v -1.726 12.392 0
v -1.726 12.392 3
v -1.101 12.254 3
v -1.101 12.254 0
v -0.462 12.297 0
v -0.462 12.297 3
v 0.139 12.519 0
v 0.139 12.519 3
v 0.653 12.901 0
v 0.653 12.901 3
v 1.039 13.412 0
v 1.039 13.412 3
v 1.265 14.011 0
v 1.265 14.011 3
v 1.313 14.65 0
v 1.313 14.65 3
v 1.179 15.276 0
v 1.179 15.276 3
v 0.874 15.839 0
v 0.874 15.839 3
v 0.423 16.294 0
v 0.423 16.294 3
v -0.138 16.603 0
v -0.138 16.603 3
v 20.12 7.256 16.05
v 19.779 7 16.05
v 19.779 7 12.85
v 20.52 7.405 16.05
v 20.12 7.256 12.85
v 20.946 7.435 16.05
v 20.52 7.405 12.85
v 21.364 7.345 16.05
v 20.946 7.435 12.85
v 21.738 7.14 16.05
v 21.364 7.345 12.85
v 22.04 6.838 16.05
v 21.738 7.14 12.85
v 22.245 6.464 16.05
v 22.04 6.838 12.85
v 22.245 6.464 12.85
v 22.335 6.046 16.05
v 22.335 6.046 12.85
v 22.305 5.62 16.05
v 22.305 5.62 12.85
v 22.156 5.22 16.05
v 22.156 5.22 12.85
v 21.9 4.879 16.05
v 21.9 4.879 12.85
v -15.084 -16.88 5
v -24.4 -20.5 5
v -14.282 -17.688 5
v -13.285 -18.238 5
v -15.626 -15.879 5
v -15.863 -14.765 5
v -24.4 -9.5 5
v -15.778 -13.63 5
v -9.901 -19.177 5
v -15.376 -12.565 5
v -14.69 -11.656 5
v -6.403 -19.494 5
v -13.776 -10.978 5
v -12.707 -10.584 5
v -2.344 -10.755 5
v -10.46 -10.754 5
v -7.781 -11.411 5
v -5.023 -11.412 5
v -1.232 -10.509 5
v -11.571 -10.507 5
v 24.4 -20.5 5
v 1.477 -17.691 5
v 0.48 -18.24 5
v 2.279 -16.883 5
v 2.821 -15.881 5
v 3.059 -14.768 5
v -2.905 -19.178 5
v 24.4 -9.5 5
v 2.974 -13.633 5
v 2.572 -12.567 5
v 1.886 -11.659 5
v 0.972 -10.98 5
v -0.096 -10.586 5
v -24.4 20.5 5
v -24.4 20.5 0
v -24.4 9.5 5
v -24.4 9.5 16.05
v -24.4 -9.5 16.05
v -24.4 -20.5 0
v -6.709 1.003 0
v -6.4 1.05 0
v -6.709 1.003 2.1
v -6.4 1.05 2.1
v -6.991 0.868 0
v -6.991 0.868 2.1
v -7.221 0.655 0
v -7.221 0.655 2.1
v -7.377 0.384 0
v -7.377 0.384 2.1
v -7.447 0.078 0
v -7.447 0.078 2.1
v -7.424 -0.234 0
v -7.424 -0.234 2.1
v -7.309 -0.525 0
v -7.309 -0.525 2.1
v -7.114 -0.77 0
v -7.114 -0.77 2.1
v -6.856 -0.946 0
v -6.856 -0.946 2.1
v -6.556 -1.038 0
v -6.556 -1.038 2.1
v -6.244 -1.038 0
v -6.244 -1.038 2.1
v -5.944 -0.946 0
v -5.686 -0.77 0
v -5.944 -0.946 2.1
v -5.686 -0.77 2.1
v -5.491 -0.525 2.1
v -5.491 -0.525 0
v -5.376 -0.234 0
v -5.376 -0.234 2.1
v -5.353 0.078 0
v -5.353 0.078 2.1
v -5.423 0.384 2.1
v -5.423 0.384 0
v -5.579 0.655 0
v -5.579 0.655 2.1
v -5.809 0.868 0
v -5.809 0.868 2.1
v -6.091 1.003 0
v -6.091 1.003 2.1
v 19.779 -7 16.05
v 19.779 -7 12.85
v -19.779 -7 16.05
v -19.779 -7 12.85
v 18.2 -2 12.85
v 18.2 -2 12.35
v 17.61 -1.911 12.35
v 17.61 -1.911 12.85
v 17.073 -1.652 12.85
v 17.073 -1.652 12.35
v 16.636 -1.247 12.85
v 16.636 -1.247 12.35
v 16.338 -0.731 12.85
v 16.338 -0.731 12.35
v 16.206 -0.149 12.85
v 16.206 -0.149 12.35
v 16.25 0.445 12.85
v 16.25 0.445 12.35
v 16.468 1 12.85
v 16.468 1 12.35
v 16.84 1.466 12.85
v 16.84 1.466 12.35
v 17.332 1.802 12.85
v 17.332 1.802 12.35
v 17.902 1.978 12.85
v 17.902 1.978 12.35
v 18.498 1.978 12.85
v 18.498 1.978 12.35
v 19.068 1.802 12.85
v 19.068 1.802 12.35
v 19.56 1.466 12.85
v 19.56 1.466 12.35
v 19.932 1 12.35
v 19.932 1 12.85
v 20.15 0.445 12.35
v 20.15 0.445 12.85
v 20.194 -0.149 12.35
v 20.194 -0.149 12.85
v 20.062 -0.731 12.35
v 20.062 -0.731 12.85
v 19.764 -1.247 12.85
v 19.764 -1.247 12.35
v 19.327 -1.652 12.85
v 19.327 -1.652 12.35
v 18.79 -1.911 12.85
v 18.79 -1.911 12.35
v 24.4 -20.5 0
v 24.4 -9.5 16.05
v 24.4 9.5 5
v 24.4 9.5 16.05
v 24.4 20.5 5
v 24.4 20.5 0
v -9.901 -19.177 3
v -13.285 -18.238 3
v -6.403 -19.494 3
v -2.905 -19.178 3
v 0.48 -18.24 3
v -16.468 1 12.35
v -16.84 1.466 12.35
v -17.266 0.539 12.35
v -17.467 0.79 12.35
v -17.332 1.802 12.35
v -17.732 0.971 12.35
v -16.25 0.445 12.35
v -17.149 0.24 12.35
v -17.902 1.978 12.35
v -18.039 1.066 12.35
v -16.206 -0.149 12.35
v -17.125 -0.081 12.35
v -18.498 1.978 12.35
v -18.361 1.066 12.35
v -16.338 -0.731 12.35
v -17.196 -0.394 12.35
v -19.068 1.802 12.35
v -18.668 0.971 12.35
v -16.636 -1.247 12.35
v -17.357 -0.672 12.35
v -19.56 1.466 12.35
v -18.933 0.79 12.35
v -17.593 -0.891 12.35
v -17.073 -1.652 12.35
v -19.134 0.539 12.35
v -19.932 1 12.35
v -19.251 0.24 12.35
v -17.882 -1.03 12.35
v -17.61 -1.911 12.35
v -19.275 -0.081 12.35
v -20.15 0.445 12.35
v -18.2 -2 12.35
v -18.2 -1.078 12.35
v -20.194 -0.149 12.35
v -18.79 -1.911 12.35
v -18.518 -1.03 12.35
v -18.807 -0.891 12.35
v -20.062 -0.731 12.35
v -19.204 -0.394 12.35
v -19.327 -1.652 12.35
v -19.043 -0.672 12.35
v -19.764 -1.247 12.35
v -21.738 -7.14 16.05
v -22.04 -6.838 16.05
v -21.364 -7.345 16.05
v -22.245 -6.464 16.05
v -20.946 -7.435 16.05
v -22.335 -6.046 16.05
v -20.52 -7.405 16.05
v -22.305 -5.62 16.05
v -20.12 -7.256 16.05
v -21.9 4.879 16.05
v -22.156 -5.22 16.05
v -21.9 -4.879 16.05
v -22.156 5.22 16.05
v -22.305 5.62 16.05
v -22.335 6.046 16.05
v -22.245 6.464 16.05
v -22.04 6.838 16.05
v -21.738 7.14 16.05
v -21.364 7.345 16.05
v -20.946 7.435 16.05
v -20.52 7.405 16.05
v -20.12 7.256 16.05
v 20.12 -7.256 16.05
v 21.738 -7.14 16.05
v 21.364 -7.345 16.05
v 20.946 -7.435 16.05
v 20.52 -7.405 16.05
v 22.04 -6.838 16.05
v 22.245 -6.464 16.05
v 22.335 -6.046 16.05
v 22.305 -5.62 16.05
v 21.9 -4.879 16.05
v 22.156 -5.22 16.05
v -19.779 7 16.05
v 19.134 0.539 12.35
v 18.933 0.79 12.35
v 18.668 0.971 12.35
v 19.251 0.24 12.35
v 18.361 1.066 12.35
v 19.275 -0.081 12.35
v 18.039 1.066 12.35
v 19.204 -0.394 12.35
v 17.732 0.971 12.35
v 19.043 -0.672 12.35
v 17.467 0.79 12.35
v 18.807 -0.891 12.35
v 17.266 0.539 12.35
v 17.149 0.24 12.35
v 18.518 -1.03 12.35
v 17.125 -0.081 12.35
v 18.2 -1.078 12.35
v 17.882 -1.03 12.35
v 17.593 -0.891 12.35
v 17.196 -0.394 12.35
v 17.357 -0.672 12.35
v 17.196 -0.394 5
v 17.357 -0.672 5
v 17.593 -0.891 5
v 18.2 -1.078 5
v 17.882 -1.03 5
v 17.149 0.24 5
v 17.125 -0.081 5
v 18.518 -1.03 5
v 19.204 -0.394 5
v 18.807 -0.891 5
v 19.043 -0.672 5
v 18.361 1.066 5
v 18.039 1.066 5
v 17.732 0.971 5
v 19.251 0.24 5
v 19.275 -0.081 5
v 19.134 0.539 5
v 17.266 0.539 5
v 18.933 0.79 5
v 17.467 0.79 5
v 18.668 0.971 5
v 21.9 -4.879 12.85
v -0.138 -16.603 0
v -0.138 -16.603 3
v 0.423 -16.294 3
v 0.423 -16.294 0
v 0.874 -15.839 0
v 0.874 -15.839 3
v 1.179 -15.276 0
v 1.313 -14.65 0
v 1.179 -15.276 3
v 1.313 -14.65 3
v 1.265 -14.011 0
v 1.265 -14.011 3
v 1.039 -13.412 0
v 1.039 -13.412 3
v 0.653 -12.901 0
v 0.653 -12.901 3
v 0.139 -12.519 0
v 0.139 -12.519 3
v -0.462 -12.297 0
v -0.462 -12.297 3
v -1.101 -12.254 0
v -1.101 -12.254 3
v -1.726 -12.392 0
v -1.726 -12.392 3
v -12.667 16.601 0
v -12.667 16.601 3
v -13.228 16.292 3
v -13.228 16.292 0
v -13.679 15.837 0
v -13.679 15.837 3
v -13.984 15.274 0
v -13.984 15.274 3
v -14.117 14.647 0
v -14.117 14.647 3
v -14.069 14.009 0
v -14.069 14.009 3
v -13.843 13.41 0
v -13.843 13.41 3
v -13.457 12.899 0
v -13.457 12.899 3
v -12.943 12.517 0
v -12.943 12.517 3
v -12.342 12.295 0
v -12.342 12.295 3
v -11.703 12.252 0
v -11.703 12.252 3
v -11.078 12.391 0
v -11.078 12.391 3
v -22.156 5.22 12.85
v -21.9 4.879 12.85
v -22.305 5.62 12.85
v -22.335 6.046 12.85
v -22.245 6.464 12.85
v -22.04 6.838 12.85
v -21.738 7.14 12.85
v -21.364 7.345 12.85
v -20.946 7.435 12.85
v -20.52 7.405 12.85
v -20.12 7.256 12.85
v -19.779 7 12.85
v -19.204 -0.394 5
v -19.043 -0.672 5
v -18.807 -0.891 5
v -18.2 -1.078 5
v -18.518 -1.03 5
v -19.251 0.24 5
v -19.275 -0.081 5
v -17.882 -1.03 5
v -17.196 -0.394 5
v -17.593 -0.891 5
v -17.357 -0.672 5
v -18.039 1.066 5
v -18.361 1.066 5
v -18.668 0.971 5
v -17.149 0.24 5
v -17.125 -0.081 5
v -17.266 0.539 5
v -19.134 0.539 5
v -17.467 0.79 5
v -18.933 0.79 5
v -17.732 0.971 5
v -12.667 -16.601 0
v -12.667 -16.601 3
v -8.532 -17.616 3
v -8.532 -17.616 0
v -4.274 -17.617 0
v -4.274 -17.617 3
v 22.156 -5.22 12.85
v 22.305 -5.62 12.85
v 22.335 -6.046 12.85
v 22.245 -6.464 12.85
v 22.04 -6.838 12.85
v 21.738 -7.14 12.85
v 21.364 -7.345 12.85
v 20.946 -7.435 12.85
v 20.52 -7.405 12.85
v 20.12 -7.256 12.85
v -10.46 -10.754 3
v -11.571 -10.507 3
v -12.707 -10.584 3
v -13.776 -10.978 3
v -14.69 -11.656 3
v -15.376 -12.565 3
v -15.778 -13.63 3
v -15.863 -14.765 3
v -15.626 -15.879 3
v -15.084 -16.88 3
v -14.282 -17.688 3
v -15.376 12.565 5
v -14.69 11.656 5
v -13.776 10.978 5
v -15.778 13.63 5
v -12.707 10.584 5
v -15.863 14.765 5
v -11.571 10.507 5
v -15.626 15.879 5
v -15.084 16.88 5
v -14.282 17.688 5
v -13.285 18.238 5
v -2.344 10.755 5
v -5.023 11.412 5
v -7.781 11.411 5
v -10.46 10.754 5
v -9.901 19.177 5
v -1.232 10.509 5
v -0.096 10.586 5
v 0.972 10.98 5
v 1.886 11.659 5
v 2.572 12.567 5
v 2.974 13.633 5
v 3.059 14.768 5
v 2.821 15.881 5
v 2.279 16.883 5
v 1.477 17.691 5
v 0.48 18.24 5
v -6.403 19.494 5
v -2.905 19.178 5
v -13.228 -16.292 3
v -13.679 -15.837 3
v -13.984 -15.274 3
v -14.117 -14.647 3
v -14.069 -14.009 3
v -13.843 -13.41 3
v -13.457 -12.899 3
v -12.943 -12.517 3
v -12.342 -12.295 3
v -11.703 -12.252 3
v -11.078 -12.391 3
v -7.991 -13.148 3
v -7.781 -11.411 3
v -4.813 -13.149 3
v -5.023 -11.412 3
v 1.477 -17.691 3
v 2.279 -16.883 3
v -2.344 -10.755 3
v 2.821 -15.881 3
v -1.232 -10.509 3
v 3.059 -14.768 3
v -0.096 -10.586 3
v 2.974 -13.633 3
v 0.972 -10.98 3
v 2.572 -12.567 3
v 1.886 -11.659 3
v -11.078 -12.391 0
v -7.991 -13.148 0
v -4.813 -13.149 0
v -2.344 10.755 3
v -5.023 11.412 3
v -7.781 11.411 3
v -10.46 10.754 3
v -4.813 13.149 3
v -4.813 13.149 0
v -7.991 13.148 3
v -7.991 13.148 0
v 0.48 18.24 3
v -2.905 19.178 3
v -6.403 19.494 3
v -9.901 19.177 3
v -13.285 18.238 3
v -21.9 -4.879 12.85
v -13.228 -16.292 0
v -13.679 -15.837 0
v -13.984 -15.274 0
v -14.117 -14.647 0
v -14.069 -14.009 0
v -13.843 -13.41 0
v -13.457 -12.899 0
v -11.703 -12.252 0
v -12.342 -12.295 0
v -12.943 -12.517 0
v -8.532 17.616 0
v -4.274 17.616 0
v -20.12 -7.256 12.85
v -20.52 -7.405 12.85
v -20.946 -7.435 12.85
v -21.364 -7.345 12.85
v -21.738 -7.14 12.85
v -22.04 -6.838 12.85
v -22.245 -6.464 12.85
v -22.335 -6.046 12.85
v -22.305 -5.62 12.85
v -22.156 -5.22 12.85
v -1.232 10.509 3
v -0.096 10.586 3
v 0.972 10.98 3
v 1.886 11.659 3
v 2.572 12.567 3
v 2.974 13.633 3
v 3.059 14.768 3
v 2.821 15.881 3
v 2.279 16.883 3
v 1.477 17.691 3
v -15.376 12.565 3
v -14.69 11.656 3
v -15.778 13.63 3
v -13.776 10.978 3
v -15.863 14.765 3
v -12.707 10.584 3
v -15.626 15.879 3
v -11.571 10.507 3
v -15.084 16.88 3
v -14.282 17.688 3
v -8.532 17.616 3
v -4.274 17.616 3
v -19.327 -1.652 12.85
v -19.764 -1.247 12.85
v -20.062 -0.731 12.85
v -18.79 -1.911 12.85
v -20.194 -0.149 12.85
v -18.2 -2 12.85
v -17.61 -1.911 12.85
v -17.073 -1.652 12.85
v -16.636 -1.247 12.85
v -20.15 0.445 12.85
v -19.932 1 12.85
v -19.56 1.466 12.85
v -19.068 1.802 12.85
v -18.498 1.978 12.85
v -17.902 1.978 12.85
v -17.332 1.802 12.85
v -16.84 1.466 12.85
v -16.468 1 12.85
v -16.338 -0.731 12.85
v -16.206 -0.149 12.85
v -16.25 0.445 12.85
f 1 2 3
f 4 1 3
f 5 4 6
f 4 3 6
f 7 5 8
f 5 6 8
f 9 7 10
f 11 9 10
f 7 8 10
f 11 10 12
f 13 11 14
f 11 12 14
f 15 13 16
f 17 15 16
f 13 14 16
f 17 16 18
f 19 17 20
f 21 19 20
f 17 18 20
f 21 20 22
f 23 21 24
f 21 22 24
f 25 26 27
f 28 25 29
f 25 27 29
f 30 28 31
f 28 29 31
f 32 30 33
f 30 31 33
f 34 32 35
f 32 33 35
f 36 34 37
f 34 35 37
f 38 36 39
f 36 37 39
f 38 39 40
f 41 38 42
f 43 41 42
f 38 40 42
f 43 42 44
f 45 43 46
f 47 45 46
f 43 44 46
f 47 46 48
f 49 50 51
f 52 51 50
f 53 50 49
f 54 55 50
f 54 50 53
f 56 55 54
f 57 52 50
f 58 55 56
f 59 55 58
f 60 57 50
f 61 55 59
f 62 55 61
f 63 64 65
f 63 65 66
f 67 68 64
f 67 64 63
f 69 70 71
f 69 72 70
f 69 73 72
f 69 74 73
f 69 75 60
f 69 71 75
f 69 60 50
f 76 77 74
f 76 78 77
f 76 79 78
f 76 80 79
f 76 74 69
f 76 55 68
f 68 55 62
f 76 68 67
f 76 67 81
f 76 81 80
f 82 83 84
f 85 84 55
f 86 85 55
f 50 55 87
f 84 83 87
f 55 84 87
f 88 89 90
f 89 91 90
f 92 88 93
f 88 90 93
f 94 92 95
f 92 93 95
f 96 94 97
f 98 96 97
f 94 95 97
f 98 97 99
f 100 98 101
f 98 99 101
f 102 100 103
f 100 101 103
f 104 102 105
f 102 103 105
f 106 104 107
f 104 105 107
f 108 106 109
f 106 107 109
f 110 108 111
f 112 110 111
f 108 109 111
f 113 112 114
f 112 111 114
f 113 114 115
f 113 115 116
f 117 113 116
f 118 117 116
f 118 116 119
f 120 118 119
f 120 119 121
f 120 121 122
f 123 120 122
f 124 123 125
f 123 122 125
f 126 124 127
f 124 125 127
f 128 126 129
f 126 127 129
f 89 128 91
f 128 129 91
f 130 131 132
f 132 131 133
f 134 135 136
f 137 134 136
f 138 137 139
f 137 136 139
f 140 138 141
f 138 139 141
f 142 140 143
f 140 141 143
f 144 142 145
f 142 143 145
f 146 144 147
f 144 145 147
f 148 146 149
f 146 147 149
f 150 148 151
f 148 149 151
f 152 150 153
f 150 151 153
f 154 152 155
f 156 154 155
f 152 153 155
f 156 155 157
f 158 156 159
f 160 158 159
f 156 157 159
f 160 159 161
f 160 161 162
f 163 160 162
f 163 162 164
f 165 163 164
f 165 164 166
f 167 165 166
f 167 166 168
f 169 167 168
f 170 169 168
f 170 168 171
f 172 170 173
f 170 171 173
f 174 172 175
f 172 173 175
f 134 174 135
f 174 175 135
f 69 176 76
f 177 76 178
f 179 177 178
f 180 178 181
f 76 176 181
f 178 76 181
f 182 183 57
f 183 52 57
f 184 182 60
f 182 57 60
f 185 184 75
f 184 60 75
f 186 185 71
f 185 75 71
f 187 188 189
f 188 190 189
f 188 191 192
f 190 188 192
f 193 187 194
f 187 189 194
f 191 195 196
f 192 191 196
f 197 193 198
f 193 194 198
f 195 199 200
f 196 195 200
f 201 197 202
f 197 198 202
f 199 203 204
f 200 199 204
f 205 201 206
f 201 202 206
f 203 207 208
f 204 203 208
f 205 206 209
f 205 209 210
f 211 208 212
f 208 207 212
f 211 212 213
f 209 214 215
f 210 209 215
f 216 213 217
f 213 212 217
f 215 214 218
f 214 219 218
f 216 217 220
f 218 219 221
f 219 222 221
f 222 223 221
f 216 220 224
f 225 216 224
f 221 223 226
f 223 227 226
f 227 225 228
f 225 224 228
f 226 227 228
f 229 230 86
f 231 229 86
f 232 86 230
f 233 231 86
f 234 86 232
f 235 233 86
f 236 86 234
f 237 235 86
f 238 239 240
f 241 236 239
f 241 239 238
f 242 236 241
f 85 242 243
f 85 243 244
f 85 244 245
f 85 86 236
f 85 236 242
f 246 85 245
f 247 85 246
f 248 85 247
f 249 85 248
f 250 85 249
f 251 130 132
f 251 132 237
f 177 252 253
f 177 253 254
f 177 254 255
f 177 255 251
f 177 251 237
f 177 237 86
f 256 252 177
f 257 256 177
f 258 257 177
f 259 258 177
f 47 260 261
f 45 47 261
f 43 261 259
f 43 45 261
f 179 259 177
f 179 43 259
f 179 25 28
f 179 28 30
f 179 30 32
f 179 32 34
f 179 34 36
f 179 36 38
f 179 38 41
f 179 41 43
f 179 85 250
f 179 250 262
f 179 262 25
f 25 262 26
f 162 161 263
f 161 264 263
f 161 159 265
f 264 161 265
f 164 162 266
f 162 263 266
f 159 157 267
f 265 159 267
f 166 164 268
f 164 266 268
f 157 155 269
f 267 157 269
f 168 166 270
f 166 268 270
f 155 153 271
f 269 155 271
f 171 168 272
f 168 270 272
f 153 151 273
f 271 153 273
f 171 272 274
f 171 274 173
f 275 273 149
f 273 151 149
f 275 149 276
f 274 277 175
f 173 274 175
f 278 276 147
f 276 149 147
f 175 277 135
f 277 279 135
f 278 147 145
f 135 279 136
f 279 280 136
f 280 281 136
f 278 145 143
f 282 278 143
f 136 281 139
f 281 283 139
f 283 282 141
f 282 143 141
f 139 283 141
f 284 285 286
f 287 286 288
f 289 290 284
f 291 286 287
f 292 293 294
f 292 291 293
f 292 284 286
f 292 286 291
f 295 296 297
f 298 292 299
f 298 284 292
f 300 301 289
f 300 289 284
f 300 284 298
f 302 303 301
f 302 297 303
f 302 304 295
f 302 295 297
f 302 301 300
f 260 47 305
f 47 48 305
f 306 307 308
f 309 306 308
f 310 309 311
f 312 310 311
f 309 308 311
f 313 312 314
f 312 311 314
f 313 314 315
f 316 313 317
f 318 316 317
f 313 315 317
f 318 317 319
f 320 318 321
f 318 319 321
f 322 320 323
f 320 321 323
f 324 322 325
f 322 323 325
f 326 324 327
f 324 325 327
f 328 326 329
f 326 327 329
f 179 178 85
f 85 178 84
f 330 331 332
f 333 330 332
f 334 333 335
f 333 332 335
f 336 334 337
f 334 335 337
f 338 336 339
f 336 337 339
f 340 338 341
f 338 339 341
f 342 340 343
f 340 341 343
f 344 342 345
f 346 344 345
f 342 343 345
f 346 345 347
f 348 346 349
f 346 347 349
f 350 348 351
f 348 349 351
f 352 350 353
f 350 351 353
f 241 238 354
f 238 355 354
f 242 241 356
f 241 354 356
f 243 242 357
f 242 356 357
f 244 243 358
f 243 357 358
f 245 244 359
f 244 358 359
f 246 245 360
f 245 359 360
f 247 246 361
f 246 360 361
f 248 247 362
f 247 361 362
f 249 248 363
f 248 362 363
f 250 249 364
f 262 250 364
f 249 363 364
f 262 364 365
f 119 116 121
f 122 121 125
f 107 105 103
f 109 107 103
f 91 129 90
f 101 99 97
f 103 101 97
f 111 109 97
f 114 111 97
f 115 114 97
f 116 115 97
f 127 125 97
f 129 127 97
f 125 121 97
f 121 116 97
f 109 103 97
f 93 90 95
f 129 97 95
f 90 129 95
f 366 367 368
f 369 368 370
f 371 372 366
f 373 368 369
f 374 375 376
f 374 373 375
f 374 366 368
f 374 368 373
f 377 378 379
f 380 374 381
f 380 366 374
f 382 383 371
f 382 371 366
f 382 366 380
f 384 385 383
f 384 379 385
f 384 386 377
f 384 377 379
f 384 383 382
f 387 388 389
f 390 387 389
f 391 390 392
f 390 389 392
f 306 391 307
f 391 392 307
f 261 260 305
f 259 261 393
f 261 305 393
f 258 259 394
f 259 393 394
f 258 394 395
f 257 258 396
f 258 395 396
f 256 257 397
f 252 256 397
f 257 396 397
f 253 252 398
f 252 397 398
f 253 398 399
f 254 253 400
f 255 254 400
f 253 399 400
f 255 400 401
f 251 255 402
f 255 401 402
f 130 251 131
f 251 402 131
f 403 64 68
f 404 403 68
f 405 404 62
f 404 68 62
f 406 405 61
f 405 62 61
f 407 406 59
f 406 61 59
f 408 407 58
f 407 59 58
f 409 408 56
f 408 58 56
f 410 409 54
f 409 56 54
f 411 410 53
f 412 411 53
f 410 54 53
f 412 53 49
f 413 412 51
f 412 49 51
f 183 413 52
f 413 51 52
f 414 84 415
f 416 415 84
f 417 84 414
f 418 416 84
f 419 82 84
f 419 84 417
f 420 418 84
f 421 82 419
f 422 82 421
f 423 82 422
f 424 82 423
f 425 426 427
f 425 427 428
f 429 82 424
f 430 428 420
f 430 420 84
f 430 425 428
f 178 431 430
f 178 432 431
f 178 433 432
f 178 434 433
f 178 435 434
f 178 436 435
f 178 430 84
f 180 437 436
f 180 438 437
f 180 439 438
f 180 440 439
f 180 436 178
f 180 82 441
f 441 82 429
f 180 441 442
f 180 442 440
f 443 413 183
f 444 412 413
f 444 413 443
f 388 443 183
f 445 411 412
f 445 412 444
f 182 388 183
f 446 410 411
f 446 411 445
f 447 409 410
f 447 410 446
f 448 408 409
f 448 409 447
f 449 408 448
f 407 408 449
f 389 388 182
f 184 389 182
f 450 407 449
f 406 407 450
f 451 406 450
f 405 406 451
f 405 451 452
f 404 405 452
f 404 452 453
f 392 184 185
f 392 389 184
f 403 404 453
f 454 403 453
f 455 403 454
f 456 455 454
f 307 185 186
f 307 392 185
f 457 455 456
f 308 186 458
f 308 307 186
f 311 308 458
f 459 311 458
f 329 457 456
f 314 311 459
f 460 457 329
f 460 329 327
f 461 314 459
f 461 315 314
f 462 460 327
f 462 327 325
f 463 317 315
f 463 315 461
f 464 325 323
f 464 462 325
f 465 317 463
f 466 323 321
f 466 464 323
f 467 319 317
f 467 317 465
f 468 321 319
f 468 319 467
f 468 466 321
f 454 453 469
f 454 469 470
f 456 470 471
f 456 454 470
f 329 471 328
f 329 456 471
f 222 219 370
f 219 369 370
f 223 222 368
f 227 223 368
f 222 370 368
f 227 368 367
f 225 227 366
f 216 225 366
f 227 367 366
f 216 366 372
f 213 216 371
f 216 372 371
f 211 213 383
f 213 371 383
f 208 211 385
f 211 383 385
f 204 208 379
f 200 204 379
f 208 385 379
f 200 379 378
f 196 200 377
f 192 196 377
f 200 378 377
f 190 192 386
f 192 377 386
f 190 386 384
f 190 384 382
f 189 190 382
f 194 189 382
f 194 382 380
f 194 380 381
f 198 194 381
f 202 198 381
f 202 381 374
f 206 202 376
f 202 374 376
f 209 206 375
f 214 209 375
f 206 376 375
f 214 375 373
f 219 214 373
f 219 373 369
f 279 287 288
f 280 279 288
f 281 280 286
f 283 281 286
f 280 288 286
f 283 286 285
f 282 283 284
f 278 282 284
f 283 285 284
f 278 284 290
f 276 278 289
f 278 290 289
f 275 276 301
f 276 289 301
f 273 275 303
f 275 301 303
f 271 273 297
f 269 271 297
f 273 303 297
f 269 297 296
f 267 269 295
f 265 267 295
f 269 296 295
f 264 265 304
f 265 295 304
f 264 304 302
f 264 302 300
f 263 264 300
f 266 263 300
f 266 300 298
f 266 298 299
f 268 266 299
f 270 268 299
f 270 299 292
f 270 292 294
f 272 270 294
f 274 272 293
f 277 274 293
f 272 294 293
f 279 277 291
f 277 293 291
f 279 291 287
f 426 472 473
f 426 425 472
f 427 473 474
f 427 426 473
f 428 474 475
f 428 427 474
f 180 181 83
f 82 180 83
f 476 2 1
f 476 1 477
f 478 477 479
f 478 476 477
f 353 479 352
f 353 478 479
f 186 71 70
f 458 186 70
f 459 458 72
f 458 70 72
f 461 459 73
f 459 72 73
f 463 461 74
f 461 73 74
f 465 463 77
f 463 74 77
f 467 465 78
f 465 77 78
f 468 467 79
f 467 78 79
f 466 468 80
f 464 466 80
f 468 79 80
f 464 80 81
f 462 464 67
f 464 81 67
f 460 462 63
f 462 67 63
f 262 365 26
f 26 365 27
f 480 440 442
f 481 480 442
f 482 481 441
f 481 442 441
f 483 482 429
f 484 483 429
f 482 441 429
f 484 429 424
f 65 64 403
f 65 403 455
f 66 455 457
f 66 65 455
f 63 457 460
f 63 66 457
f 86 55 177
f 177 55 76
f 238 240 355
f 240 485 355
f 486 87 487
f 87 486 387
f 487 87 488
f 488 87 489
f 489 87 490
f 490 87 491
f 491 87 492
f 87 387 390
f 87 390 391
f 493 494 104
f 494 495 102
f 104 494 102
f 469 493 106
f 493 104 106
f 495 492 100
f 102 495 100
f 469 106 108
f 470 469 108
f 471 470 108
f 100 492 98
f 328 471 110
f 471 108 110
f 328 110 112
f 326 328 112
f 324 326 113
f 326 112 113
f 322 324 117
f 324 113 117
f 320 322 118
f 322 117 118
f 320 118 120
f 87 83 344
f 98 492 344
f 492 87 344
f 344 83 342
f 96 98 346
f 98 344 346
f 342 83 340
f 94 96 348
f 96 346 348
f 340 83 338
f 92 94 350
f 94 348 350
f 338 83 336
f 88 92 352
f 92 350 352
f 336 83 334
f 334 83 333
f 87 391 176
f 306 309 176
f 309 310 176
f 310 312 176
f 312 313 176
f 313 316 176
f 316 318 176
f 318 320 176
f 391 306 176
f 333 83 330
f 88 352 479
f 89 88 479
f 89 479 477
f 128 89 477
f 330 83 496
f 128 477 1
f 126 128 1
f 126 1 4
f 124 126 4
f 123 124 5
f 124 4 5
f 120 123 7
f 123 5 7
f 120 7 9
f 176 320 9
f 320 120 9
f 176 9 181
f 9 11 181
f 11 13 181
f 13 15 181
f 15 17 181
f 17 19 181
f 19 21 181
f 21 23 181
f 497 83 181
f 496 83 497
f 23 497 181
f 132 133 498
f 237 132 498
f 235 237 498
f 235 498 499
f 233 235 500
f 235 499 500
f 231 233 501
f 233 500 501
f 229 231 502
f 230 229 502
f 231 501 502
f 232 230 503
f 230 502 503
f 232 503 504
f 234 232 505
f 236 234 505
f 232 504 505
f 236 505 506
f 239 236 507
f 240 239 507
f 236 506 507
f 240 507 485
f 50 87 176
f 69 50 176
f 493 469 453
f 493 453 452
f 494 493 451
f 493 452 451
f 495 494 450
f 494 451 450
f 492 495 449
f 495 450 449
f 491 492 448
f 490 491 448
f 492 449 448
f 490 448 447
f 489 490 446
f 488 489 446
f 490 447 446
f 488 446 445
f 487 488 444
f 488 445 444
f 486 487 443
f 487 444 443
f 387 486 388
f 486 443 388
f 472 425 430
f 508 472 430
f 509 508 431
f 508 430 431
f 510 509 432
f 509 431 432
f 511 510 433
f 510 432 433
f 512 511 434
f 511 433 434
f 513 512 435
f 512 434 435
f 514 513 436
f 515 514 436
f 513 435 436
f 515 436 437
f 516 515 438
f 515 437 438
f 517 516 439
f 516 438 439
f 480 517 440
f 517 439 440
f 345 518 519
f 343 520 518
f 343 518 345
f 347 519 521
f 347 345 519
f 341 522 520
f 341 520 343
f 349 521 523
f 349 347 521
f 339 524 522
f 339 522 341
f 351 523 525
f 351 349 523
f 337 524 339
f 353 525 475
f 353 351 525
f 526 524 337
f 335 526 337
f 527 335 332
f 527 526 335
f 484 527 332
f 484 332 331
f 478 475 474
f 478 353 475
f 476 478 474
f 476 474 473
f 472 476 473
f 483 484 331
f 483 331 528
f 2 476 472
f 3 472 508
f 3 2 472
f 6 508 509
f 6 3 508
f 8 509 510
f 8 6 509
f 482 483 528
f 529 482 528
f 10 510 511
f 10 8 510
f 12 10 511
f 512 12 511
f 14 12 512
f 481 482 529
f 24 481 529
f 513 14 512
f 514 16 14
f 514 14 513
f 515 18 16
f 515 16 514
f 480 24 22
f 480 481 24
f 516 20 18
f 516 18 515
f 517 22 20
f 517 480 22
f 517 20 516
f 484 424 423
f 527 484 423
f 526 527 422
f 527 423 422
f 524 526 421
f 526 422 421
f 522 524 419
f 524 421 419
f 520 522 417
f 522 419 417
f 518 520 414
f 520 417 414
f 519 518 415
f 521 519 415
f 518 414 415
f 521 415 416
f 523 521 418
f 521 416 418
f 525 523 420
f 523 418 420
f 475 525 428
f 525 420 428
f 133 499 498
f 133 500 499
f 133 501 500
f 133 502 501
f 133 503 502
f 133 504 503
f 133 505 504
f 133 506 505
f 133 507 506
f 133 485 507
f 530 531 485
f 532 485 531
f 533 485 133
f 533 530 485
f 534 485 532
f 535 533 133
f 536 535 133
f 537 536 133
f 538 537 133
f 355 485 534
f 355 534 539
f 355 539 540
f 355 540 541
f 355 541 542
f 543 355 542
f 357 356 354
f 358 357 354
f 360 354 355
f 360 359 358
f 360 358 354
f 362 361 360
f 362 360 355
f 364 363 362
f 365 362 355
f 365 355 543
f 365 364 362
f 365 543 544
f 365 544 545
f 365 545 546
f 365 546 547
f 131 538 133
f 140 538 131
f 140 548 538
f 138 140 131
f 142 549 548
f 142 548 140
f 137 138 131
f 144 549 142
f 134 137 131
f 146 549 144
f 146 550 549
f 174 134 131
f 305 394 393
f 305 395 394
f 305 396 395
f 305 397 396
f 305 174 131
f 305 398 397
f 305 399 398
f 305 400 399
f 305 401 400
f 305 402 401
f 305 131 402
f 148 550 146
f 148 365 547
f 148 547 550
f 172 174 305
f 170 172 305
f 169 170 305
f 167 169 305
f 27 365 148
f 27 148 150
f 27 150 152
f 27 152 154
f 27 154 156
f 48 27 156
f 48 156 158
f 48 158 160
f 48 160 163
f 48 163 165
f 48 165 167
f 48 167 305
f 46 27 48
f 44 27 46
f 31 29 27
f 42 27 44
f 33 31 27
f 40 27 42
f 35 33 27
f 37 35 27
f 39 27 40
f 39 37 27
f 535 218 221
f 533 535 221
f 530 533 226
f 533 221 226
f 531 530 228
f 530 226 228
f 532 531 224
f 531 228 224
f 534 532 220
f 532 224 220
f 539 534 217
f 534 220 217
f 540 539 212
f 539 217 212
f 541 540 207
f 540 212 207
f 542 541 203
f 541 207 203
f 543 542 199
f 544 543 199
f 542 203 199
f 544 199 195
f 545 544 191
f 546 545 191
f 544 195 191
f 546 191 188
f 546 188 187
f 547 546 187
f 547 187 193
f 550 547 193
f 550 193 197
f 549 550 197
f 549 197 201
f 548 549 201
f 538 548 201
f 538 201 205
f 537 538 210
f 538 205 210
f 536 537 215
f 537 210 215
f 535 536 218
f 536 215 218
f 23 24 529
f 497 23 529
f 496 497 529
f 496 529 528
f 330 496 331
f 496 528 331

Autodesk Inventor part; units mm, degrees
ref_plane "YZ Plane" through (0, 0, 0) normal (1, 0, 0) x (0, 1, 0)
ref_plane "XZ Plane" through (0, 0, 0) normal (0, 1, 0) x (-1, 0, 0)
ref_plane "XY Plane" through (0, 0, 0) normal (0, 0, 1) x (1, 0, 0)
sketch "Sketch1" plane through (0, 0, 0) normal (0, 0, 1) x (1, 0, 0)
  line L0 (-24.4, -9.5) -> (24.4, -9.5)
  line L1 (24.4, -9.5) -> (24.4, 9.5)
  line L2 (24.4, 9.5) -> (-24.4, 9.5)
  line L3 (-24.4, 9.5) -> (-24.4, -9.5)
  line L4 (-24.4, -9.5) -> (24.4, 9.5) construction
  line L5 (24.4, -9.5) -> (-24.4, 9.5) construction
  point P0 (0, 0)
  dimension "LENGTH" = 48.8
  dimension "WIDTH" = 19
extrude "Extrusion1" add sketch "Sketch1" along normal blind 12.85
sketch "Sketch2" plane through (0, 0, 12.85) normal (0, 0, 1) x (1, 0, 0)
  point P0 (0, 0)
  point P1 (-18.2, 0)
  point P2 (18.2, 0)
  dimension "d11" = 0
  dimension "d12" = 0
  dimension "d13" = 36.4
  dimension "d14" = 18.2
hole "Hole1" at (-18.2, 0, 12.85) at (18.2, 0, 12.85) direction (0, 0, -1) diameter 2.1565 depth 8.87 thread size "4-40 UNC" class "2B" standard "ANSI Unified Screw Threads"
sketch "Sketch3" plane through (0, 0, 12.85) normal (0, 0, 1) x (1, 0, 0)
  point P0 (0, 0)
  point P1 (0, 0)
  dimension "d22" = 0
  dimension "d23" = 0
hole "Hole2" [suppressed]
sketch "Sketch4" plane through (0, 0, 0) normal (0, 0, -1) x (-1, 0, 0)
  line L0 (5.5, 0) -> (4.5, 0) construction
  line L1 (5.5, 1.05) -> (4.5, 1.05)
  line L2 (4.5, -1.05) -> (5.5, -1.05)
  arc A0 (5.5, -1.05) -> (5.5, 1.05) centre (5.5, 0) ccw
  arc A1 (4.5, 1.05) -> (4.5, -1.05) centre (4.5, 0) ccw
  point P0 (0, 0)
  point P1 (-5, 0)
  point P2 (5, 0)
  dimension "d24" = 1
  dimension "d25" = 0
  dimension "d26" = 0
  dimension "d27" = 10
  dimension "d28" = 5
  dimension "d29" = 1.05
hole "Hole3" [suppressed]
extrude "Extrusion2" [suppressed]
sketch "Sketch5" plane through (0, 0, 0) normal (0, 0, 1) x (1, 0, 0)
  line L0 (-24.4, -20.5) -> (24.4, -20.5)
  line L1 (24.4, -20.5) -> (24.4, 20.5)
  line L2 (24.4, 20.5) -> (-24.4, 20.5)
  line L3 (-24.4, 20.5) -> (-24.4, -20.5)
  line L4 (-24.4, -20.5) -> (24.4, 20.5) construction
  line L5 (24.4, -20.5) -> (-24.4, 20.5) construction
  point P0 (0, 0)
  dimension "d39" = 48.8
  dimension "d40" = 41
extrude "Extrusion3" add sketch "Sketch5" along normal blind 5
sketch "Sketch7" plane through (0, 0, 12.85) normal (0, 0, 1) x (1, 0, 0)
  circle A0 centre (18.2, 0) radius 1.0782 projected
  circle A1 centre (-18.2, 0) radius 1.0782 projected
  point P0 (0, 0)
  dimension "d54" = 0
  dimension "d55" = 0
  dimension "d56" = 0
  dimension "d57" = 0
hole "Hole5" at (18.2, 0, 12.85) at (-18.2, 0, 12.85) direction (0, 0, -1) diameter 4 depth 0.5
sketch "Sketch8" plane through (0, 0, 0) normal (0, 0, -1) x (-1, 0, 0)
  line L0 (0, 5.5) -> (0, 4.5) construction
  line L1 (-1.05, 5.5) -> (-1.05, 4.5)
  line L2 (1.05, 4.5) -> (1.05, 5.5)
  arc A0 (1.05, 5.5) -> (-1.05, 5.5) centre (0, 5.5) ccw
  arc A1 (-1.05, 4.5) -> (1.05, 4.5) centre (0, 4.5) ccw
  point P0 (0, 0)
  point P1 (0, -5)
  point P2 (0, 5)
  dimension "d77" = 1
  dimension "d78" = 1.05
  dimension "d79" = 10
  dimension "d80" = 0
  dimension "d81" = 0
  dimension "d82" = 5
hole "Hole6" [suppressed]
extrude "Extrusion4" [suppressed]
sketch "Sketch10" plane through (0, 0, 12.85) normal (0, 0, 1) x (1, 0, 0)
  line L0 (-24.4, -9.5) -> (24.4, -9.5)
  line L1 (24.4, -9.5) -> (24.4, 9.5)
  line L2 (24.4, 9.5) -> (-24.4, 9.5)
  line L3 (-24.4, 9.5) -> (-24.4, -9.5)
  line L4 (-24.4, -9.5) -> (24.4, 9.5) construction
  line L5 (24.4, -9.5) -> (-24.4, 9.5) construction
  line L6 (21.9, -7) -> (-21.9, -7)
  line L7 (-21.9, -7) -> (-21.9, 7)
  line L8 (-21.9, 7) -> (21.9, 7)
  line L9 (21.9, 7) -> (21.9, -7)
  line L10 (21.9, -7) -> (-21.9, 7) construction
  line L11 (-21.9, -7) -> (21.9, 7) construction
  circle A0 centre (-20.8393, 5.9393) radius 1.5
  circle A1 centre (-20.8393, -5.9393) radius 1.5
  circle A2 centre (20.8393, 5.9393) radius 1.5
  circle A3 centre (20.8393, -5.9393) radius 1.5
  line L12 (20.8393, 5.9393) -> (21.9, 7)
  line L13 (21.9, -7) -> (20.8393, -5.9393)
  line L14 (-20.8393, 5.9393) -> (-21.9, 7)
  line L15 (-20.8393, -5.9393) -> (-21.9, -7)
  point P0 (0, 0)
  point P1 (21.9, -4.8787)
  point P2 (19.7787, -7)
  point P3 (-19.7787, -7)
  point P4 (-21.9, -4.8787)
  point P5 (-21.9, 4.8787)
  point P6 (-19.7787, 7)
  point P7 (19.7787, 7)
  point P8 (21.9, 4.8787)
  dimension "d106" = 3
  dimension "d110" = 3
  dimension "d111" = 3
  dimension "d112" = 3
  dimension "d97" = 48.8
  dimension "d98" = 19
  dimension "d99" = 43.8
  dimension "d100" = 14
  dimension "d107" = 45
  dimension "d108" = 45
  dimension "d109" = 45
extrude "Extrusion6" add sketch "Sketch10" along normal blind 3.2
chamfer "Chamfer5" [suppressed]
sketch "Sketch12" plane through (0, 0, 5) normal (0, 0, 1) x (1, 0, 0)
  arc A0 (7.9961, 15.4962) -> (-8.004, 14.5013) centre (9.4196, -136.543) ccw construction
  arc A1 (7.9587, 19.496) -> (-8.4624, 18.4749) centre (9.4196, -136.543) ccw
  arc A2 (8.0336, 11.4964) -> (-7.5457, 10.5276) centre (9.4196, -136.543) ccw
  arc A3 (8.0336, 11.4964) -> (7.9587, 19.496) centre (7.9961, 15.4962) ccw
  arc A4 (-8.4624, 18.4749) -> (-7.5457, 10.5276) centre (-8.004, 14.5013) ccw
  line L0 (24.4, 2.961) -> (24.4, -2.961)
  line L1 (24.4, 0) -> (-24.4, 0)
  line L2 (-24.4, 8.5) -> (-24.4, -8.5)
  arc A5 (7.9961, 15.4962) -> (-8.004, 14.5013) centre (9.4196, -136.543) ccw construction
  arc A6 (7.9751, 17.7461) -> (-8.2619, 16.7364) centre (9.4196, -136.543) ccw
  arc A7 (8.0172, 13.2463) -> (-7.7462, 12.2661) centre (9.4196, -136.543) ccw
  arc A8 (8.0172, 13.2463) -> (7.9751, 17.7461) centre (7.9961, 15.4962) ccw
  arc A9 (-8.2619, 16.7364) -> (-7.7462, 12.2661) centre (-8.004, 14.5013) ccw
  arc A10 (-8.004, -14.5013) -> (7.9961, -15.4962) centre (9.4196, 136.543) ccw construction
  arc A11 (-8.4624, -18.4749) -> (7.9587, -19.496) centre (9.4196, 136.543) ccw
  arc A12 (-7.5457, -10.5276) -> (8.0336, -11.4964) centre (9.4196, 136.543) ccw
  arc A13 (7.9587, -19.496) -> (8.0336, -11.4964) centre (7.9961, -15.4962) ccw
  arc A14 (-7.5457, -10.5276) -> (-8.4624, -18.4749) centre (-8.004, -14.5013) ccw
  arc A15 (-8.004, -14.5013) -> (7.9961, -15.4962) centre (9.4196, 136.543) ccw construction
  arc A16 (-8.2619, -16.7364) -> (7.9751, -17.7461) centre (9.4196, 136.543) ccw
  arc A17 (-7.7462, -12.2661) -> (8.0172, -13.2463) centre (9.4196, 136.543) ccw
  arc A18 (7.9751, -17.7461) -> (8.0172, -13.2463) centre (7.9961, -15.4962) ccw
  arc A19 (-7.7462, -12.2661) -> (-8.2619, -16.7364) centre (-8.004, -14.5013) ccw
  point P0 (0, 0)
  point P1 (-8.004, 12.753)
  point P2 (7.9961, 17.2527)
  point P3 (-6.4165, 14.3405)
  point P4 (9.5836, 18.8402)
  point P5 (-8.004, -12.753)
  point P6 (7.9961, -17.2527)
  point P7 (9.5836, -18.8402)
  point P8 (-6.4165, -14.3405)
  dimension "d118" = 8
  dimension "d122" = 4.5
extrude "Extrusion12" [suppressed]
extrude "Extrusion13" [suppressed]
sketch "Sketch14" plane through (0, 0, 0) normal (0, 0, -1) x (-1, 0, 0)
  point P0 (0, 0)
  point P1 (6.4, 0)
hole "Hole7" at (-6.4, 0, 0) direction (0, 0, 1) diameter 2.1 depth 2.1
sketch "Sketch15" plane through (0, 0, 0) normal (0, 0, -1) x (-1, 0, 0)
  circle A0 centre (6.4, 0) radius 1.05 projected
  circle A1 centre (6.4, 0) radius 19.5
  circle A2 centre (6.4, 0) radius 11.5
  circle A3 centre (6.4, 0) radius 17.75
  circle A4 centre (6.4, 0) radius 13.25
  line L0 (-24.4, 9.5) -> (24.4, 9.5) projected
  line L1 (24.4, 9.5) -> (-24.4, 9.5)
  line L2 (-24.4, -20.5) -> (-24.4, 20.5) projected
  line L3 (24.4, -9.5) -> (-24.4, -9.5) projected
  line L4 (24.4, -9.5) -> (-24.4, -9.5)
  arc A5 (9.3371, 17.5053) -> (5.1369, 17.705) centre (6.4, 0) ccw
  arc A6 (8.5925, 13.0673) -> (5.4572, 13.2164) centre (6.4, 0) ccw
  arc A7 (13.9857, 17.9641) -> (-1.4292, 17.8592) centre (6.4, 0) ccw
  arc A8 (10.8736, 10.5942) -> (1.7828, 10.5324) centre (6.4, 0) ccw
  arc A9 (11.8707, 14.5025) -> (0.9294, 14.5025) centre (6.4, 0) ccw construction
  arc A10 (13.2825, 18.2451) -> (-0.4824, 18.2451) centre (6.4, 0) ccw
  arc A11 (10.4589, 10.7599) -> (2.3412, 10.7599) centre (6.4, 0) ccw
  arc A12 (10.4589, 10.7599) -> (13.2825, 18.2451) centre (11.8707, 14.5025) ccw
  arc A13 (-0.4824, 18.2451) -> (2.3412, 10.7599) centre (0.9294, 14.5025) ccw
  arc A14 (11.8707, 14.5025) -> (0.9294, 14.5025) centre (6.4, 0) ccw construction
  arc A15 (12.6648, 16.6077) -> (0.1352, 16.6077) centre (6.4, 0) ccw
  arc A16 (11.0766, 12.3973) -> (1.7235, 12.3973) centre (6.4, 0) ccw
  arc A17 (11.0766, 12.3973) -> (12.6648, 16.6077) centre (11.8707, 14.5025) ccw
  arc A18 (0.1352, 16.6077) -> (1.7235, 12.3973) centre (0.9294, 14.5025) ccw
  line L5 (24.4, 9.5) -> (24.4, -9.5) projected
  line L6 (24.4, 0) -> (-24.4, 0)
  arc A19 (5.1369, -17.705) -> (9.3371, -17.5053) centre (6.4, 0) ccw
  arc A20 (5.4572, -13.2164) -> (8.5925, -13.0673) centre (6.4, 0) ccw
  arc A21 (-1.4292, -17.8592) -> (13.9857, -17.9641) centre (6.4, 0) ccw
  arc A22 (1.7828, -10.5324) -> (10.8736, -10.5942) centre (6.4, 0) ccw
  arc A23 (0.9294, -14.5025) -> (11.8707, -14.5025) centre (6.4, 0) ccw construction
  arc A24 (-0.4824, -18.2451) -> (13.2825, -18.2451) centre (6.4, 0) ccw
  arc A25 (2.3412, -10.7599) -> (10.4589, -10.7599) centre (6.4, 0) ccw
  arc A26 (13.2825, -18.2451) -> (10.4589, -10.7599) centre (11.8707, -14.5025) ccw
  arc A27 (2.3412, -10.7599) -> (-0.4824, -18.2451) centre (0.9294, -14.5025) ccw
  arc A28 (0.9294, -14.5025) -> (11.8707, -14.5025) centre (6.4, 0) ccw construction
  arc A29 (0.1352, -16.6077) -> (12.6648, -16.6077) centre (6.4, 0) ccw
  arc A30 (1.7235, -12.3973) -> (11.0766, -12.3973) centre (6.4, 0) ccw
  arc A31 (12.6648, -16.6077) -> (11.0766, -12.3973) centre (11.8707, -14.5025) ccw
  arc A32 (1.7235, -12.3973) -> (0.1352, -16.6077) centre (0.9294, -14.5025) ccw
  point P0 (0, 0)
  point P1 (-24.4, -19.5)
  point P2 (-24.4, 19.5)
  point P3 (24.4, 8.5)
  point P4 (24.4, -8.5)
  point P5 (6.4, 15.5)
  point P6 (6.4, -15.5)
  dimension "d140" = 39
  dimension "d141" = 23
  dimension "d142" = 35.5
  dimension "d143" = 26.5
  dimension "d147" = 8
  dimension "d148" = 4.5
sketch "Sketch17" plane through (0, 0, 5) normal (0, 0, 1) x (1, 0, 0)
  circle A0 centre (-6.4, 0) radius 1.05 projected
  arc A1 (-11.8725, -14.4958) -> (-0.9318, -14.4974) centre (-6.4, 0) ccw construction
  arc A2 (-12.6672, -16.6008) -> (-0.1378, -16.6026) centre (-6.4, 0) ccw
  arc A3 (-11.0779, -12.3908) -> (-1.7259, -12.3922) centre (-6.4, 0) ccw
  arc A4 (-11.0779, -12.3908) -> (-12.6672, -16.6008) centre (-11.8725, -14.4958) ccw
  arc A5 (-0.1378, -16.6026) -> (-1.7259, -12.3922) centre (-0.9318, -14.4974) ccw
  arc A6 (-11.8725, -14.4958) -> (-0.9318, -14.4974) centre (-6.4, 0) ccw construction
  arc A7 (-13.2853, -18.238) -> (0.4798, -18.24) centre (-6.4, 0) ccw
  arc A8 (-10.4598, -10.7536) -> (-2.3435, -10.7548) centre (-6.4, 0) ccw
  arc A9 (-10.4598, -10.7536) -> (-13.2853, -18.238) centre (-11.8725, -14.4958) ccw
  arc A10 (0.4798, -18.24) -> (-2.3435, -10.7548) centre (-0.9318, -14.4974) ccw
  line L0 (-24.1444, 0) -> (24.3913, 0)
  line L1 (24.3913, 0) -> (-24.1444, 0)
  arc A11 (-0.9318, 14.4974) -> (-11.8725, 14.4958) centre (-6.4, 0) ccw construction
  arc A12 (-0.1378, 16.6026) -> (-12.6672, 16.6008) centre (-6.4, 0) ccw
  arc A13 (-1.7259, 12.3922) -> (-11.0779, 12.3908) centre (-6.4, 0) ccw
  arc A14 (-12.6672, 16.6008) -> (-11.0779, 12.3908) centre (-11.8725, 14.4958) ccw
  arc A15 (-1.7259, 12.3922) -> (-0.1378, 16.6026) centre (-0.9318, 14.4974) ccw
  arc A16 (-0.9318, 14.4974) -> (-11.8725, 14.4958) centre (-6.4, 0) ccw construction
  arc A17 (0.4798, 18.24) -> (-13.2853, 18.238) centre (-6.4, 0) ccw
  arc A18 (-2.3435, 10.7548) -> (-10.4598, 10.7536) centre (-6.4, 0) ccw
  arc A19 (-13.2853, 18.238) -> (-10.4598, 10.7536) centre (-11.8725, 14.4958) ccw
  arc A20 (-2.3435, 10.7548) -> (0.4798, 18.24) centre (-0.9318, 14.4974) ccw
  point P0 (0, 0)
  point P1 (-0.9324, -14.4958)
  point P2 (-0.9324, 14.4958)
  dimension "d149" = 4.5
  dimension "d150" = 8
extrude "Extrusion14" cut sketch "Sketch17" against normal through all contours A4 A3 A5 A2 | A15 A13 A14 A12
extrude "Extrusion15" cut sketch "Sketch17" against normal blind 2 contours A9 A8 A10 A7 | A20 A18 A19 A17
equation "\"d2\" = BEAM_HEIGHT - APERTURE_HEIGHT"
equation "\"d14\" = 0.5 * d13"
equation "\"d39\" = LENGTH"
equation "\"d106\" = d110"
equation "\"d111\" = d110"
equation "\"d112\" = d110"
equation "\"d97\" = LENGTH"
equation "\"d98\" = WIDTH"
equation "\"BEAM_HEIGHT\" = 19.05"
equation "\"APERTURE_HEIGHT\" = 6.2"
properties part number "ADAPTER_AOM-brimrose"
